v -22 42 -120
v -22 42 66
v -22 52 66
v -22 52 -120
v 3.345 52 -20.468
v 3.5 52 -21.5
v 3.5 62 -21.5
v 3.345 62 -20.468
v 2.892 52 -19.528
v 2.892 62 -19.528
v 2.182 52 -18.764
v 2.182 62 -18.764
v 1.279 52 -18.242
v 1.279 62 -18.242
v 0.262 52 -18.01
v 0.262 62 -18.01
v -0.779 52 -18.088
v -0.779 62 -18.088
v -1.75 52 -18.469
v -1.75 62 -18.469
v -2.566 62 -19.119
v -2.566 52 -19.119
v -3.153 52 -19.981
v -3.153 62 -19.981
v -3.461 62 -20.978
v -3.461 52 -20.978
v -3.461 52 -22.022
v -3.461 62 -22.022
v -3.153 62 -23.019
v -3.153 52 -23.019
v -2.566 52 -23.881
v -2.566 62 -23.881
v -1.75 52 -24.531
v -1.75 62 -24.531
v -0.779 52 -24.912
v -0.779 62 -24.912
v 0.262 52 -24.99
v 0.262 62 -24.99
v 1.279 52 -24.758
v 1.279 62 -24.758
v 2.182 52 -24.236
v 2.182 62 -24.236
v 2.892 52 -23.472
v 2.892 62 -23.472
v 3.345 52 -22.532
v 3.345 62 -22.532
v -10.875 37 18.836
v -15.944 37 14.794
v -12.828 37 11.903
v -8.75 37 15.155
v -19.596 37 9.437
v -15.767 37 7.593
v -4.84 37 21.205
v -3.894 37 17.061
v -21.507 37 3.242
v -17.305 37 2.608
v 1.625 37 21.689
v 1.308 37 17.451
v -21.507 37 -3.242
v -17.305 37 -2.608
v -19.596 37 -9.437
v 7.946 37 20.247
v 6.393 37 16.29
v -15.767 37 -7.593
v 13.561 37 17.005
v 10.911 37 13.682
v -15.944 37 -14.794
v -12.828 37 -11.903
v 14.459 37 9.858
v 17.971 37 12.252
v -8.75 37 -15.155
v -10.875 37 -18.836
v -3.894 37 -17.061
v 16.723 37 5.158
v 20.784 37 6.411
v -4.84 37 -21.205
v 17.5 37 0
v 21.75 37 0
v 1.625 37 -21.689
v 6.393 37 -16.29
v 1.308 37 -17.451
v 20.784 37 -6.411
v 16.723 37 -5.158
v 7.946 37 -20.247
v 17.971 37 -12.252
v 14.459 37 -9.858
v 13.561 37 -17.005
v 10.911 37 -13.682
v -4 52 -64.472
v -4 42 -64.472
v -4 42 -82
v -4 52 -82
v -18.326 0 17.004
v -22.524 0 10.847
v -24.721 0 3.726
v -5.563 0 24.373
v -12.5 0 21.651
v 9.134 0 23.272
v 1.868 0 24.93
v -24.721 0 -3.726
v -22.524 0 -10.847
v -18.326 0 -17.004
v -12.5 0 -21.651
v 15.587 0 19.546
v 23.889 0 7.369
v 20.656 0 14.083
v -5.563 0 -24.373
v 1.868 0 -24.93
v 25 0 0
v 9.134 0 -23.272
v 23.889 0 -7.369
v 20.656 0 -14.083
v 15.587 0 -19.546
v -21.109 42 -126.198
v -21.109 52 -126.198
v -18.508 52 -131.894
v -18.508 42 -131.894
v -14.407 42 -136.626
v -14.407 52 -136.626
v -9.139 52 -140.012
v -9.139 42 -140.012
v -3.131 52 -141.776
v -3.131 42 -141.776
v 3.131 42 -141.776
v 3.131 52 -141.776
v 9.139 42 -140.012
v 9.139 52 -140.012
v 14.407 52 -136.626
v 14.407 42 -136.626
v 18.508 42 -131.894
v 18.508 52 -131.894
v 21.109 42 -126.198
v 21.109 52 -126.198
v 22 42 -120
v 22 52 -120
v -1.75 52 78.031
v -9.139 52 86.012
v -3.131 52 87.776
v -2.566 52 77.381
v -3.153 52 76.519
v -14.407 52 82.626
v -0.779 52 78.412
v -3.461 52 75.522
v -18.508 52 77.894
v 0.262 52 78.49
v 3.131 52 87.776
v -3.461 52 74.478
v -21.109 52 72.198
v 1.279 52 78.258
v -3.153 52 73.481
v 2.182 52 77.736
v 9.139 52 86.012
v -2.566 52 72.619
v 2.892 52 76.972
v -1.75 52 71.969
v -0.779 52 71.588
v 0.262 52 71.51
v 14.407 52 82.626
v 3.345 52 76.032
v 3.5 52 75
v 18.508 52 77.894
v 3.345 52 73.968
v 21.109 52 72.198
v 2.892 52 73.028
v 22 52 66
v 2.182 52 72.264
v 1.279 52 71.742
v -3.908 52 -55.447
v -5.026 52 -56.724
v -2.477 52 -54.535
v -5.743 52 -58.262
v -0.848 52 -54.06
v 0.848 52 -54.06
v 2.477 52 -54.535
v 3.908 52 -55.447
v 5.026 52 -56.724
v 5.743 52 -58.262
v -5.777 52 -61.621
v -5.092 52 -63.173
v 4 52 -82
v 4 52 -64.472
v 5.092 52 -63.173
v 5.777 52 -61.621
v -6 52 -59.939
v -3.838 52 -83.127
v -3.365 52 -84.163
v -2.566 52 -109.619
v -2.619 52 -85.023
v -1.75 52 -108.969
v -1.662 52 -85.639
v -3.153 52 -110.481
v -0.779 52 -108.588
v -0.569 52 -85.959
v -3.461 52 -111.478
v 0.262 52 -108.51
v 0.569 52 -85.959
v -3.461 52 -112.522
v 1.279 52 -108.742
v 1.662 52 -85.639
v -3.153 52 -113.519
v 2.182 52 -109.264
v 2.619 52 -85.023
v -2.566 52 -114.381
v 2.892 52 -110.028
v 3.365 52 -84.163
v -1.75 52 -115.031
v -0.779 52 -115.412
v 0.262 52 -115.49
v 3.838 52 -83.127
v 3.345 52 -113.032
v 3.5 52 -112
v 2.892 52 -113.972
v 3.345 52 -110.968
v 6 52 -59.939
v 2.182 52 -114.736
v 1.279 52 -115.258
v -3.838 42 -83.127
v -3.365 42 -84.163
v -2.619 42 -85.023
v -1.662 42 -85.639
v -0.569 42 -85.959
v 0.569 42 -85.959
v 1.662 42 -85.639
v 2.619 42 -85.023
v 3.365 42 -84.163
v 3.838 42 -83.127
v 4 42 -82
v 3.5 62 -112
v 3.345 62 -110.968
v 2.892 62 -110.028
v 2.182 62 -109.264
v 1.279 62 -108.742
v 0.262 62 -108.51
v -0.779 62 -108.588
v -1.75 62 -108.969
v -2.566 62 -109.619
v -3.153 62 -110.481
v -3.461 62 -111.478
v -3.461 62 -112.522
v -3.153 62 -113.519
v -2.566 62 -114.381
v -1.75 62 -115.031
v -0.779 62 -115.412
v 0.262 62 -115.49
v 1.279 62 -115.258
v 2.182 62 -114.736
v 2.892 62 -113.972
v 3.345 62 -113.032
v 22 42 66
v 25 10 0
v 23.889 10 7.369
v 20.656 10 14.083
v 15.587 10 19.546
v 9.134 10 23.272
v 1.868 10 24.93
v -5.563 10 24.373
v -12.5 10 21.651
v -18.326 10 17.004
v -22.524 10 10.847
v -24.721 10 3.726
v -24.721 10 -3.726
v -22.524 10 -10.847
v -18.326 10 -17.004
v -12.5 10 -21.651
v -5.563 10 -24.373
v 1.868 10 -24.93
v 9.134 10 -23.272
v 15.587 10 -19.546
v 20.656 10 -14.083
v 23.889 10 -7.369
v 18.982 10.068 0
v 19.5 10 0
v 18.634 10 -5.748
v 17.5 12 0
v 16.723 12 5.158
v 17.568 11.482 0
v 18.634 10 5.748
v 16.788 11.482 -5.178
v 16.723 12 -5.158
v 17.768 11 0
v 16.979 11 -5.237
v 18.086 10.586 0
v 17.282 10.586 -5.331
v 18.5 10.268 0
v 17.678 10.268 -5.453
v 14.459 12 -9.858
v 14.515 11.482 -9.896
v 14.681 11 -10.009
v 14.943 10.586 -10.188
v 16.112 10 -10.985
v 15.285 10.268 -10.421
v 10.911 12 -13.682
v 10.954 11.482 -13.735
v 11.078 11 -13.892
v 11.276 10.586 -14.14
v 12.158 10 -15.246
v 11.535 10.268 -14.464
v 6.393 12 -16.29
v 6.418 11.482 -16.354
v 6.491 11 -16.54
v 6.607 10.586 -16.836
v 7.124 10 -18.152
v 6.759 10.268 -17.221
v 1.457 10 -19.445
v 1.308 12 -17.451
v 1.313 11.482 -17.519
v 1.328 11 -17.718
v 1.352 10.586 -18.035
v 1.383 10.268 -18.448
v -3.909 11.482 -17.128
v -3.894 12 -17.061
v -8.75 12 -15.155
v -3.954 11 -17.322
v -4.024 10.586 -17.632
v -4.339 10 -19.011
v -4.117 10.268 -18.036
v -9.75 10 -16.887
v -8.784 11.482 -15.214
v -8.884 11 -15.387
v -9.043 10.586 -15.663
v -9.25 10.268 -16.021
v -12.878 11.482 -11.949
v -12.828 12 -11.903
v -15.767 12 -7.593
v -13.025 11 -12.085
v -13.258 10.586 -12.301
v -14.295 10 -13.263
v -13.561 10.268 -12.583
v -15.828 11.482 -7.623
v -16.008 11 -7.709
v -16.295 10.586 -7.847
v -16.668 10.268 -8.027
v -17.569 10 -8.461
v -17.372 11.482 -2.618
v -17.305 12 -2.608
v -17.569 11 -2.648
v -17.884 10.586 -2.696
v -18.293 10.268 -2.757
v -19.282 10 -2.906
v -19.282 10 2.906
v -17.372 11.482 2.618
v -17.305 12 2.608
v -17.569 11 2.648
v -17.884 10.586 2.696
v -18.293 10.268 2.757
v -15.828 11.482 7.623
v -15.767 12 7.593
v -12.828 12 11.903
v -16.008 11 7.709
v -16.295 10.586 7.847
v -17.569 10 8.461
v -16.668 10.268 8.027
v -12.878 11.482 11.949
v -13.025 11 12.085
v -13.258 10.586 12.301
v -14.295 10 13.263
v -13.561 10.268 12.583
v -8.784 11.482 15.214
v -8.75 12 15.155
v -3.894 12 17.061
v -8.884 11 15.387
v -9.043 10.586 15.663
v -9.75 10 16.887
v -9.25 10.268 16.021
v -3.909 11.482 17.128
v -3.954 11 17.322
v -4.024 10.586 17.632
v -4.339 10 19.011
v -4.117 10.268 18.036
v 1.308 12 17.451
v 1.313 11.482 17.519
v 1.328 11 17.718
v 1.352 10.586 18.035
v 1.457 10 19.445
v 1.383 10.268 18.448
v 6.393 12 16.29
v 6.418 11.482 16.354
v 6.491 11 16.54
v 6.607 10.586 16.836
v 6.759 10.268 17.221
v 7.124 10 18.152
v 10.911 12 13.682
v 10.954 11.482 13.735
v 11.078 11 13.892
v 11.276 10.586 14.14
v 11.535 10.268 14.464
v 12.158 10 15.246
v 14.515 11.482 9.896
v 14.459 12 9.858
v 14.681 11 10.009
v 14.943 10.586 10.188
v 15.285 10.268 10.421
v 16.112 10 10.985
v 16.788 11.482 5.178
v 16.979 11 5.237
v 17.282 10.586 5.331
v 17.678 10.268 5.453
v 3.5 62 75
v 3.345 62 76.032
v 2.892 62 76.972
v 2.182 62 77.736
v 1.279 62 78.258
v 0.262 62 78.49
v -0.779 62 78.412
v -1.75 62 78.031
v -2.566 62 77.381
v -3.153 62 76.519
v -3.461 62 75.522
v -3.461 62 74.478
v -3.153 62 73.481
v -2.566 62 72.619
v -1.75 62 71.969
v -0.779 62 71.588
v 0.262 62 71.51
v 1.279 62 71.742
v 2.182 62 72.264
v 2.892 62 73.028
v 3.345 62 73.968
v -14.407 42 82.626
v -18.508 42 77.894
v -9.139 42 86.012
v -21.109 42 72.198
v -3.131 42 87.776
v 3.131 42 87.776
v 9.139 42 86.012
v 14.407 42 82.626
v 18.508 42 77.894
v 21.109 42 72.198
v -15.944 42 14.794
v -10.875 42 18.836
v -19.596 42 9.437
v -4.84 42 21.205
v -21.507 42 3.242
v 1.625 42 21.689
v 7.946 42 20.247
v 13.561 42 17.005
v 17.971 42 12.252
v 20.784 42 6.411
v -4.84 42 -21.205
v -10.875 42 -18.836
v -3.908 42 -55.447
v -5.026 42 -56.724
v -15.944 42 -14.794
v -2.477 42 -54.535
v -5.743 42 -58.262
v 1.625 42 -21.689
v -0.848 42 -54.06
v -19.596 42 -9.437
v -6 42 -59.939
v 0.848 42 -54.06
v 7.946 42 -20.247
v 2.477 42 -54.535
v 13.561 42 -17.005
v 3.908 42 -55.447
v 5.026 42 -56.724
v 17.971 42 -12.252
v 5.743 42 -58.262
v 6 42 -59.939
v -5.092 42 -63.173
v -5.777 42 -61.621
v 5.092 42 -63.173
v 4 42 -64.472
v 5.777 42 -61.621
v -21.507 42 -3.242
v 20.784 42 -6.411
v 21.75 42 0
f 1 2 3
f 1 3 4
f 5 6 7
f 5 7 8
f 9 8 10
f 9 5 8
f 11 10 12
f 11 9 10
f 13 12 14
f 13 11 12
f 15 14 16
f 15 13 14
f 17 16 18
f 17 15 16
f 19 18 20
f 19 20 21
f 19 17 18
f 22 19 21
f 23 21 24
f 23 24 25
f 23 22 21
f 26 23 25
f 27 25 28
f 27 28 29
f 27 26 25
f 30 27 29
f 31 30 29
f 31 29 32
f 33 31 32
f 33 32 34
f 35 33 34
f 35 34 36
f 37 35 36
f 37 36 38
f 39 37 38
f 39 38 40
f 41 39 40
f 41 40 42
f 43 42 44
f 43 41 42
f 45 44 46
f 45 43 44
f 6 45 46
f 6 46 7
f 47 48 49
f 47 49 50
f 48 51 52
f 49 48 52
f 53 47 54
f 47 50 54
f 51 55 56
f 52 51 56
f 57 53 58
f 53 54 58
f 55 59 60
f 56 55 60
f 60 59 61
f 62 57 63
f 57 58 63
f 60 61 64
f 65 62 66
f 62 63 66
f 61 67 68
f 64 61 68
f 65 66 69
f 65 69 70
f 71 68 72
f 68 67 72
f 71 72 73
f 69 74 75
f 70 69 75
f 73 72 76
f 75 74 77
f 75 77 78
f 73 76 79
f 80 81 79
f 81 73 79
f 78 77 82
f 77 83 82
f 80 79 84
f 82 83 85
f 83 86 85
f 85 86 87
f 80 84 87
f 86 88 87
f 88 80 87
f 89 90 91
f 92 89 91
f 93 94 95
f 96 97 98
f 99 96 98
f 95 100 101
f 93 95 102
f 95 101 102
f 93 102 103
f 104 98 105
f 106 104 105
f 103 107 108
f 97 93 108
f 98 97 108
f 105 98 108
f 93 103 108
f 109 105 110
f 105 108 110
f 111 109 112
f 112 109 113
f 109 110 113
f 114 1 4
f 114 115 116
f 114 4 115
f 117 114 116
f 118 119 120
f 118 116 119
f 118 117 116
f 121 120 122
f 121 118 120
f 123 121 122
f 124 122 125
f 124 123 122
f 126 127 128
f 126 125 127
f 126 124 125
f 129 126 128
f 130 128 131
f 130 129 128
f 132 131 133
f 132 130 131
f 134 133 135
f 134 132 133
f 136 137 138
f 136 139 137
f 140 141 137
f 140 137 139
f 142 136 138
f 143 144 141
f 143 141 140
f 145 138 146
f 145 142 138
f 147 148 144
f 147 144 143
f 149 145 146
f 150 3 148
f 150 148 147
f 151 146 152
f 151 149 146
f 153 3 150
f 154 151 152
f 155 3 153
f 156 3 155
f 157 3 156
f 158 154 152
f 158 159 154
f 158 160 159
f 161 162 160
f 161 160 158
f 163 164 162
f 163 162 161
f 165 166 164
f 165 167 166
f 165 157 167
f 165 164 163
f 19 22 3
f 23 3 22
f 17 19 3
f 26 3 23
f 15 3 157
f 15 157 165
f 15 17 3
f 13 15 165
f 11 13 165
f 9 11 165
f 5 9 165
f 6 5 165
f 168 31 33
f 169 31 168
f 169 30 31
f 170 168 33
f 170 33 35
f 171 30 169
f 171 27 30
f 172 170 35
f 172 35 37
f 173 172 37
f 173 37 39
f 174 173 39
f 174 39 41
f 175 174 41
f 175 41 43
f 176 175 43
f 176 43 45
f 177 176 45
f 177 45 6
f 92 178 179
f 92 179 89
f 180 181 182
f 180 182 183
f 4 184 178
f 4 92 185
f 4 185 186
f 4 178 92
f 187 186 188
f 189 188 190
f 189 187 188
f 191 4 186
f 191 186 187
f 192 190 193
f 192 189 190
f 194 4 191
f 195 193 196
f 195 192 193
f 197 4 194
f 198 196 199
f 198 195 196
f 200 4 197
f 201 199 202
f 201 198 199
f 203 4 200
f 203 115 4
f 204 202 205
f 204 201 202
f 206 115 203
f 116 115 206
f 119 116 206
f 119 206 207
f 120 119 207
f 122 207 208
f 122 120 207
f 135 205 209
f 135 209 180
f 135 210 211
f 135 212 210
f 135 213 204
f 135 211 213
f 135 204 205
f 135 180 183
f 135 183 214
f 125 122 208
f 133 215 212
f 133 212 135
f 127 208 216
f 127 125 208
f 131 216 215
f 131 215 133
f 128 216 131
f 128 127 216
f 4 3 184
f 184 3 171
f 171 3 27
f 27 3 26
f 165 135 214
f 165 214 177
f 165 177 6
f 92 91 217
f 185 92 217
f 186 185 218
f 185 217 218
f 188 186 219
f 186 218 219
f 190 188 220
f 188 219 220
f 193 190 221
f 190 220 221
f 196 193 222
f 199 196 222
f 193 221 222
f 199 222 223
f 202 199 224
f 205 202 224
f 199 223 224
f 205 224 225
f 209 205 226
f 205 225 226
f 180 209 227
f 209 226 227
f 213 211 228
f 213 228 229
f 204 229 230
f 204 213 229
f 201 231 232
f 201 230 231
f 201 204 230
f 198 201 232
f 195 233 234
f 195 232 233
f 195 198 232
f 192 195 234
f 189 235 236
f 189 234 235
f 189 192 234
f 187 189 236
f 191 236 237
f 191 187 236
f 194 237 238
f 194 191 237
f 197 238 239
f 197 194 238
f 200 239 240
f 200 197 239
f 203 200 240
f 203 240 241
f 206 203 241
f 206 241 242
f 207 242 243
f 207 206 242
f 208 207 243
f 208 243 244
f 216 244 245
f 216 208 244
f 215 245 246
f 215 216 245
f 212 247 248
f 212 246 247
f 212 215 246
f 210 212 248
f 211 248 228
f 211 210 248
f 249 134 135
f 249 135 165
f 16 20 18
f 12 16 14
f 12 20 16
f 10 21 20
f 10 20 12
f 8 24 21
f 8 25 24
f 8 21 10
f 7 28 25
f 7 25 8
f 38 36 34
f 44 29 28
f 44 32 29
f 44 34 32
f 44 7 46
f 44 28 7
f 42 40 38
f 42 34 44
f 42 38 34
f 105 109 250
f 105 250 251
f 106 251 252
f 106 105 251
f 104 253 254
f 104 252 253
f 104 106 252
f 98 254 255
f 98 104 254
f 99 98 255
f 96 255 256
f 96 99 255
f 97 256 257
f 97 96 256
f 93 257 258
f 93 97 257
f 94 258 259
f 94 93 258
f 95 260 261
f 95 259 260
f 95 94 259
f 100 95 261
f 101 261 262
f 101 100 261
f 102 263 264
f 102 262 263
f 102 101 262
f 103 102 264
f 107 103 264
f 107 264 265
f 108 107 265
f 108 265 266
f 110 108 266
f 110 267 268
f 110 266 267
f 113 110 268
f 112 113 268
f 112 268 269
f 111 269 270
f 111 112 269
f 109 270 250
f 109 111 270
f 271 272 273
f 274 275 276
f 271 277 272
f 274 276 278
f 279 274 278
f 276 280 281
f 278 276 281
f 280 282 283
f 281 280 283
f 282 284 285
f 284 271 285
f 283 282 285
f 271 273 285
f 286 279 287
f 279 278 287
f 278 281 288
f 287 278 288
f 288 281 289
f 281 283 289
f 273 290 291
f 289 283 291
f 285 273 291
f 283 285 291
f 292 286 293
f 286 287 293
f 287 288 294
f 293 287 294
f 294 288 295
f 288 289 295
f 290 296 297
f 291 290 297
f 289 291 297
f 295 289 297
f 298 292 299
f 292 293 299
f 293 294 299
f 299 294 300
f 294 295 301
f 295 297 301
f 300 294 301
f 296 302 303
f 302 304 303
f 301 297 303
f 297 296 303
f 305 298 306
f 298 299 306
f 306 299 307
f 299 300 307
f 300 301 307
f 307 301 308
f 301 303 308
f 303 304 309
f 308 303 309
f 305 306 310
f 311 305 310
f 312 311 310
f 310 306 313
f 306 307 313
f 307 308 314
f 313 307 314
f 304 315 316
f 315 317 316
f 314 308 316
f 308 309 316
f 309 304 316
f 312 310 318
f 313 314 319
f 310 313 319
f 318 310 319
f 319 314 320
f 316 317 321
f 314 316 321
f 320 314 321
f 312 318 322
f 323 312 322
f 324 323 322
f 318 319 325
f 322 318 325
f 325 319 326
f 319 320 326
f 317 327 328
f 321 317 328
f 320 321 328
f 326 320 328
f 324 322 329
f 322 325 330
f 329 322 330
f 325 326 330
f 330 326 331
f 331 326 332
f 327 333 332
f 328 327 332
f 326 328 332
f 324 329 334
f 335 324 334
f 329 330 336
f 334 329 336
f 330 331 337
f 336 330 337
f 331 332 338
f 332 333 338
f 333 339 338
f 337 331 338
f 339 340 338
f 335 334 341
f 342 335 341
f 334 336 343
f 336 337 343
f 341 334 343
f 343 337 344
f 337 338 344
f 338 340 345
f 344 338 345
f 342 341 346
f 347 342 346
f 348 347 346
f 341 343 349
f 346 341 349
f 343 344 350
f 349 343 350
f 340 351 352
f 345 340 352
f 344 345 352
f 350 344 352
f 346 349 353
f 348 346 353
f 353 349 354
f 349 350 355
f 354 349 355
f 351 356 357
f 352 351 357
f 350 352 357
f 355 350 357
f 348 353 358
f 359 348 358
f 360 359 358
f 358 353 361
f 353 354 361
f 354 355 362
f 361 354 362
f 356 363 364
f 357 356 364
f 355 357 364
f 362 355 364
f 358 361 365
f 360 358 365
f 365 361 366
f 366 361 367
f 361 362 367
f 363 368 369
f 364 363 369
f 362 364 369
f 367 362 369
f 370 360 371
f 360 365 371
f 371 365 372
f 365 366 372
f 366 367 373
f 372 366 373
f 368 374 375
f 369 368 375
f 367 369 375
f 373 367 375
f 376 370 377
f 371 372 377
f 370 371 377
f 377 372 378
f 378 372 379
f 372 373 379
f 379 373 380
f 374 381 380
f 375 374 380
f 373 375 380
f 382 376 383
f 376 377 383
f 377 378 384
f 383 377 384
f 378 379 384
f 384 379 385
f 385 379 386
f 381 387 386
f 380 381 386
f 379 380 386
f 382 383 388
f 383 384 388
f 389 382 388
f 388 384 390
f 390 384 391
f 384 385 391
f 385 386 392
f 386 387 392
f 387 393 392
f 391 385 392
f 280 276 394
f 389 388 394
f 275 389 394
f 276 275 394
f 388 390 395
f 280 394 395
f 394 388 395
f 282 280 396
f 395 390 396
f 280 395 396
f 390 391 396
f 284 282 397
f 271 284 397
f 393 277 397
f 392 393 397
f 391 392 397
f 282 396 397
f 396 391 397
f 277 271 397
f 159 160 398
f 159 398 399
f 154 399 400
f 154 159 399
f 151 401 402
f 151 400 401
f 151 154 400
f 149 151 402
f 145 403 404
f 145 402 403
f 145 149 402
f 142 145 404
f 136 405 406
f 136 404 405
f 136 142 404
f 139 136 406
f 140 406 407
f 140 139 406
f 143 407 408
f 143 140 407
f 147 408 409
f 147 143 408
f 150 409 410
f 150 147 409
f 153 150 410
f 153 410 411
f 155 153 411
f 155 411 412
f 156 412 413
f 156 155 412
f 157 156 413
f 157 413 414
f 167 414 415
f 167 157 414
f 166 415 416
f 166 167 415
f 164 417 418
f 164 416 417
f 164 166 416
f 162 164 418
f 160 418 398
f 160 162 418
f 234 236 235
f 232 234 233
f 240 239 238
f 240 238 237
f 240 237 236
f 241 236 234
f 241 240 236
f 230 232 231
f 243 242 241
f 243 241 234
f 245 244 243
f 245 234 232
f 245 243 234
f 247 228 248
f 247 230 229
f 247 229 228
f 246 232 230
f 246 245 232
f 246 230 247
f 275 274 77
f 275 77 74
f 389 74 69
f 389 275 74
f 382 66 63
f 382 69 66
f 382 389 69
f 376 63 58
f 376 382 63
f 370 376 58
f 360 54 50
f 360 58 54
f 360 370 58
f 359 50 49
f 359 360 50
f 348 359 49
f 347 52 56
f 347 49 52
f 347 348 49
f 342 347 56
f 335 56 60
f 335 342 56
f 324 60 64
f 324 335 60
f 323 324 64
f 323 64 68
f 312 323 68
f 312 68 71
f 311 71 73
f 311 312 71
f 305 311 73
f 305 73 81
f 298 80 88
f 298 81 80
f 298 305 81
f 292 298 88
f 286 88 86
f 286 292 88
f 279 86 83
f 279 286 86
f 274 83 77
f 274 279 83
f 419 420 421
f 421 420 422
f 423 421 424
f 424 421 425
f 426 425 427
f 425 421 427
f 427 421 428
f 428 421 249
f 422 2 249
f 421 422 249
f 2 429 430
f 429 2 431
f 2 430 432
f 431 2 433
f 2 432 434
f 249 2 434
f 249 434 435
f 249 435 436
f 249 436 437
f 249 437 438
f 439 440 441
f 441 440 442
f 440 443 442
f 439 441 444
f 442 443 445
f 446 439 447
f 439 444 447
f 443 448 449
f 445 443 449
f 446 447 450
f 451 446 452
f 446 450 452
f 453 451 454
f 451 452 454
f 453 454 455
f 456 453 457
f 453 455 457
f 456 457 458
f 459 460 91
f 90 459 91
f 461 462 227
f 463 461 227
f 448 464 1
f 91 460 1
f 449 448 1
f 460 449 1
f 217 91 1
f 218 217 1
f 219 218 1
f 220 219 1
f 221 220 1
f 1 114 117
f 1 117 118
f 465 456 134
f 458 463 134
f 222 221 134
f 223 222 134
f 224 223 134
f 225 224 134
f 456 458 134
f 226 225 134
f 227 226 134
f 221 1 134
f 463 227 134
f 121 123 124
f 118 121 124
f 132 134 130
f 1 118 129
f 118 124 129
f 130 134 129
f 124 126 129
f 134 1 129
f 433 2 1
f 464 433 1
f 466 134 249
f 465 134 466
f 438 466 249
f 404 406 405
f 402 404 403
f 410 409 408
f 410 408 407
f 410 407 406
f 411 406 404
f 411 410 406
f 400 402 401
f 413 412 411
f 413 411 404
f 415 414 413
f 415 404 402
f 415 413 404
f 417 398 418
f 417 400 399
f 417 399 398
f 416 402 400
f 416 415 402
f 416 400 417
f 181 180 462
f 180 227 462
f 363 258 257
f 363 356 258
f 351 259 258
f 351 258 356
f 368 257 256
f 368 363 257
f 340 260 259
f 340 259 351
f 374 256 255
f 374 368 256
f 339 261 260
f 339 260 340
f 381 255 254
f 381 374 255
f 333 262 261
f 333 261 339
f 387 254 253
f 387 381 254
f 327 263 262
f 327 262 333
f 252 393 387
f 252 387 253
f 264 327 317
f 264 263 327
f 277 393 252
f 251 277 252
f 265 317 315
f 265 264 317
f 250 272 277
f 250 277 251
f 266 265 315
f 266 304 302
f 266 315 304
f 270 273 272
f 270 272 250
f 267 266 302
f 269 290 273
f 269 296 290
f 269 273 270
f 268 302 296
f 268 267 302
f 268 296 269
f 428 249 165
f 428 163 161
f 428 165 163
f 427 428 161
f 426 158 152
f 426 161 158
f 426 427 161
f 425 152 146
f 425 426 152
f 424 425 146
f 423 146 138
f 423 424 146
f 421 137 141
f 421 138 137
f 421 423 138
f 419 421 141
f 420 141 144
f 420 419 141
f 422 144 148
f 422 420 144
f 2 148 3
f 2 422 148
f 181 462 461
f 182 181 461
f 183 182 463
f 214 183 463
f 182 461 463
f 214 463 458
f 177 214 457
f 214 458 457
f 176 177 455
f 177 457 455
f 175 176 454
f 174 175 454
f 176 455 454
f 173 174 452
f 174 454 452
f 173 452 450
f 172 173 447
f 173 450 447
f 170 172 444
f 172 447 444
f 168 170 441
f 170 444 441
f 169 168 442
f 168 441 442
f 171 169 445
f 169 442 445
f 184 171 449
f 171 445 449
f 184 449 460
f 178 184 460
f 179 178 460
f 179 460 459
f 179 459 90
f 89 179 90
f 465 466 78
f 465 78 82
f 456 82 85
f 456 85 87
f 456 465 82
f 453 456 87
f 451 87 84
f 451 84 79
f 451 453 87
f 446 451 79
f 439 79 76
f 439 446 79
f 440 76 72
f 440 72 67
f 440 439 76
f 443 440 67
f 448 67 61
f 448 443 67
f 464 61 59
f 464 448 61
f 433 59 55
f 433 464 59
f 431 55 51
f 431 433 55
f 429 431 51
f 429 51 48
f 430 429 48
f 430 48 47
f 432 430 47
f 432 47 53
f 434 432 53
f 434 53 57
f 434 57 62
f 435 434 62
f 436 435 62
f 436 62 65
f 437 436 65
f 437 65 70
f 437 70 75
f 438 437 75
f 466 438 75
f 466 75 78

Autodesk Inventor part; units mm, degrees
ref_plane "YZ Plane" through (0, 0, 0) normal (1, 0, 0) x (0, 1, 0)
ref_plane "XZ Plane" through (0, 0, 0) normal (0, 1, 0) x (-1, 0, 0)
ref_plane "XY Plane" through (0, 0, 0) normal (0, 0, 1) x (1, 0, 0)
sketch "Sketch1" plane through (0, 0, 0) normal (0, 0, 1) x (1, 0, 0)
  line L0 (0, 0) -> (0, 42)
  line L1 (17.5, 37) -> (17.5, 10)
  line L2 (17.5, 10) -> (25, 10)
  line L3 (25, 10) -> (25, 0)
  line L4 (25, 0) -> (0, 0)
  line L5 (17.5, 37) -> (21.75, 37)
  line L6 (21.75, 37) -> (21.75, 42)
  line L7 (21.75, 42) -> (0, 42)
  dimension "d1" = 50
  dimension "d3" = 10
  dimension "d4" = 35
  dimension "d12" = 37
  dimension "d13" = 5
  dimension "d14" = 43.5
revolve "Revolution1" add sketch "Sketch1" angle 360 about axis through (0, 0, 0) along (0, 1, 0)
sketch "Sketch3" plane through (0, 42, 0) normal (0, 1, 0) x (1, 0, 0)
  line L0 (0, -66) -> (0, 120) construction
  line L1 (-22, -66) -> (-22, 120)
  line L2 (22, 120) -> (22, -66)
  arc A0 (-22, -66) -> (22, -66) centre (0, -66) ccw
  arc A1 (22, 120) -> (-22, 120) centre (0, 120) ccw
  point P0 (0, 0)
  point P1 (0, 27)
  point P2 (0, -88)
  point P3 (0, 142)
  dimension "d16" = 44
  dimension "d17" = 88
  dimension "d18" = 230
extrude "Extrusion2" add sketch "Sketch3" along normal blind 10
fillet "Fillet2" radius 2 1 edges at (-17.5, 10, 0)
sketch "Sketch4" plane through (0, 52, 0) normal (0, 1, 0) x (1, 0, 0)
  circle A0 centre (0, -75) radius 3.5
  circle A1 centre (0, 21.5) radius 3.5
  circle A2 centre (0, 112) radius 3.5
  circle A3 centre (0, 0) radius 21.75 projected
  point P0 (0, 0)
  dimension "d23" = 7
  dimension "d24" = 21.5
  dimension "d25" = 90.5
  dimension "d26" = 75
extrude "Extrusion3" add sketch "Sketch4" along normal blind 10 contours A0 | A1 A3 | A3 A1 | A2 picked at (0.1355, 22.8044) picked at (-0.1398, 20.4874)
sketch "Sketch5" plane through (0, 42, 0) normal (0, -1, 0) x (1, 0, 0)
  arc A0 (4, -64.4721) -> (-4, -64.4721) centre (0, -60) ccw
  circle A1 centre (0, 0) radius 21.75 projected
  circle A2 centre (0, -112) radius 3.5 projected
  line L0 (-4, -64.4721) -> (-4, -82)
  arc A3 (-4, -82) -> (4, -82) centre (0, -82) ccw
  line L1 (4, -82) -> (4, -64.4721)
  dimension "d29" = 60
  dimension "d30" = 12
  dimension "d31" = 4
  dimension "d32" = 22
extrude "Extrusion4" cut sketch "Sketch5" against normal blind 10 contours L1 A3 L0 A0
properties part number "garnitur_rund"
